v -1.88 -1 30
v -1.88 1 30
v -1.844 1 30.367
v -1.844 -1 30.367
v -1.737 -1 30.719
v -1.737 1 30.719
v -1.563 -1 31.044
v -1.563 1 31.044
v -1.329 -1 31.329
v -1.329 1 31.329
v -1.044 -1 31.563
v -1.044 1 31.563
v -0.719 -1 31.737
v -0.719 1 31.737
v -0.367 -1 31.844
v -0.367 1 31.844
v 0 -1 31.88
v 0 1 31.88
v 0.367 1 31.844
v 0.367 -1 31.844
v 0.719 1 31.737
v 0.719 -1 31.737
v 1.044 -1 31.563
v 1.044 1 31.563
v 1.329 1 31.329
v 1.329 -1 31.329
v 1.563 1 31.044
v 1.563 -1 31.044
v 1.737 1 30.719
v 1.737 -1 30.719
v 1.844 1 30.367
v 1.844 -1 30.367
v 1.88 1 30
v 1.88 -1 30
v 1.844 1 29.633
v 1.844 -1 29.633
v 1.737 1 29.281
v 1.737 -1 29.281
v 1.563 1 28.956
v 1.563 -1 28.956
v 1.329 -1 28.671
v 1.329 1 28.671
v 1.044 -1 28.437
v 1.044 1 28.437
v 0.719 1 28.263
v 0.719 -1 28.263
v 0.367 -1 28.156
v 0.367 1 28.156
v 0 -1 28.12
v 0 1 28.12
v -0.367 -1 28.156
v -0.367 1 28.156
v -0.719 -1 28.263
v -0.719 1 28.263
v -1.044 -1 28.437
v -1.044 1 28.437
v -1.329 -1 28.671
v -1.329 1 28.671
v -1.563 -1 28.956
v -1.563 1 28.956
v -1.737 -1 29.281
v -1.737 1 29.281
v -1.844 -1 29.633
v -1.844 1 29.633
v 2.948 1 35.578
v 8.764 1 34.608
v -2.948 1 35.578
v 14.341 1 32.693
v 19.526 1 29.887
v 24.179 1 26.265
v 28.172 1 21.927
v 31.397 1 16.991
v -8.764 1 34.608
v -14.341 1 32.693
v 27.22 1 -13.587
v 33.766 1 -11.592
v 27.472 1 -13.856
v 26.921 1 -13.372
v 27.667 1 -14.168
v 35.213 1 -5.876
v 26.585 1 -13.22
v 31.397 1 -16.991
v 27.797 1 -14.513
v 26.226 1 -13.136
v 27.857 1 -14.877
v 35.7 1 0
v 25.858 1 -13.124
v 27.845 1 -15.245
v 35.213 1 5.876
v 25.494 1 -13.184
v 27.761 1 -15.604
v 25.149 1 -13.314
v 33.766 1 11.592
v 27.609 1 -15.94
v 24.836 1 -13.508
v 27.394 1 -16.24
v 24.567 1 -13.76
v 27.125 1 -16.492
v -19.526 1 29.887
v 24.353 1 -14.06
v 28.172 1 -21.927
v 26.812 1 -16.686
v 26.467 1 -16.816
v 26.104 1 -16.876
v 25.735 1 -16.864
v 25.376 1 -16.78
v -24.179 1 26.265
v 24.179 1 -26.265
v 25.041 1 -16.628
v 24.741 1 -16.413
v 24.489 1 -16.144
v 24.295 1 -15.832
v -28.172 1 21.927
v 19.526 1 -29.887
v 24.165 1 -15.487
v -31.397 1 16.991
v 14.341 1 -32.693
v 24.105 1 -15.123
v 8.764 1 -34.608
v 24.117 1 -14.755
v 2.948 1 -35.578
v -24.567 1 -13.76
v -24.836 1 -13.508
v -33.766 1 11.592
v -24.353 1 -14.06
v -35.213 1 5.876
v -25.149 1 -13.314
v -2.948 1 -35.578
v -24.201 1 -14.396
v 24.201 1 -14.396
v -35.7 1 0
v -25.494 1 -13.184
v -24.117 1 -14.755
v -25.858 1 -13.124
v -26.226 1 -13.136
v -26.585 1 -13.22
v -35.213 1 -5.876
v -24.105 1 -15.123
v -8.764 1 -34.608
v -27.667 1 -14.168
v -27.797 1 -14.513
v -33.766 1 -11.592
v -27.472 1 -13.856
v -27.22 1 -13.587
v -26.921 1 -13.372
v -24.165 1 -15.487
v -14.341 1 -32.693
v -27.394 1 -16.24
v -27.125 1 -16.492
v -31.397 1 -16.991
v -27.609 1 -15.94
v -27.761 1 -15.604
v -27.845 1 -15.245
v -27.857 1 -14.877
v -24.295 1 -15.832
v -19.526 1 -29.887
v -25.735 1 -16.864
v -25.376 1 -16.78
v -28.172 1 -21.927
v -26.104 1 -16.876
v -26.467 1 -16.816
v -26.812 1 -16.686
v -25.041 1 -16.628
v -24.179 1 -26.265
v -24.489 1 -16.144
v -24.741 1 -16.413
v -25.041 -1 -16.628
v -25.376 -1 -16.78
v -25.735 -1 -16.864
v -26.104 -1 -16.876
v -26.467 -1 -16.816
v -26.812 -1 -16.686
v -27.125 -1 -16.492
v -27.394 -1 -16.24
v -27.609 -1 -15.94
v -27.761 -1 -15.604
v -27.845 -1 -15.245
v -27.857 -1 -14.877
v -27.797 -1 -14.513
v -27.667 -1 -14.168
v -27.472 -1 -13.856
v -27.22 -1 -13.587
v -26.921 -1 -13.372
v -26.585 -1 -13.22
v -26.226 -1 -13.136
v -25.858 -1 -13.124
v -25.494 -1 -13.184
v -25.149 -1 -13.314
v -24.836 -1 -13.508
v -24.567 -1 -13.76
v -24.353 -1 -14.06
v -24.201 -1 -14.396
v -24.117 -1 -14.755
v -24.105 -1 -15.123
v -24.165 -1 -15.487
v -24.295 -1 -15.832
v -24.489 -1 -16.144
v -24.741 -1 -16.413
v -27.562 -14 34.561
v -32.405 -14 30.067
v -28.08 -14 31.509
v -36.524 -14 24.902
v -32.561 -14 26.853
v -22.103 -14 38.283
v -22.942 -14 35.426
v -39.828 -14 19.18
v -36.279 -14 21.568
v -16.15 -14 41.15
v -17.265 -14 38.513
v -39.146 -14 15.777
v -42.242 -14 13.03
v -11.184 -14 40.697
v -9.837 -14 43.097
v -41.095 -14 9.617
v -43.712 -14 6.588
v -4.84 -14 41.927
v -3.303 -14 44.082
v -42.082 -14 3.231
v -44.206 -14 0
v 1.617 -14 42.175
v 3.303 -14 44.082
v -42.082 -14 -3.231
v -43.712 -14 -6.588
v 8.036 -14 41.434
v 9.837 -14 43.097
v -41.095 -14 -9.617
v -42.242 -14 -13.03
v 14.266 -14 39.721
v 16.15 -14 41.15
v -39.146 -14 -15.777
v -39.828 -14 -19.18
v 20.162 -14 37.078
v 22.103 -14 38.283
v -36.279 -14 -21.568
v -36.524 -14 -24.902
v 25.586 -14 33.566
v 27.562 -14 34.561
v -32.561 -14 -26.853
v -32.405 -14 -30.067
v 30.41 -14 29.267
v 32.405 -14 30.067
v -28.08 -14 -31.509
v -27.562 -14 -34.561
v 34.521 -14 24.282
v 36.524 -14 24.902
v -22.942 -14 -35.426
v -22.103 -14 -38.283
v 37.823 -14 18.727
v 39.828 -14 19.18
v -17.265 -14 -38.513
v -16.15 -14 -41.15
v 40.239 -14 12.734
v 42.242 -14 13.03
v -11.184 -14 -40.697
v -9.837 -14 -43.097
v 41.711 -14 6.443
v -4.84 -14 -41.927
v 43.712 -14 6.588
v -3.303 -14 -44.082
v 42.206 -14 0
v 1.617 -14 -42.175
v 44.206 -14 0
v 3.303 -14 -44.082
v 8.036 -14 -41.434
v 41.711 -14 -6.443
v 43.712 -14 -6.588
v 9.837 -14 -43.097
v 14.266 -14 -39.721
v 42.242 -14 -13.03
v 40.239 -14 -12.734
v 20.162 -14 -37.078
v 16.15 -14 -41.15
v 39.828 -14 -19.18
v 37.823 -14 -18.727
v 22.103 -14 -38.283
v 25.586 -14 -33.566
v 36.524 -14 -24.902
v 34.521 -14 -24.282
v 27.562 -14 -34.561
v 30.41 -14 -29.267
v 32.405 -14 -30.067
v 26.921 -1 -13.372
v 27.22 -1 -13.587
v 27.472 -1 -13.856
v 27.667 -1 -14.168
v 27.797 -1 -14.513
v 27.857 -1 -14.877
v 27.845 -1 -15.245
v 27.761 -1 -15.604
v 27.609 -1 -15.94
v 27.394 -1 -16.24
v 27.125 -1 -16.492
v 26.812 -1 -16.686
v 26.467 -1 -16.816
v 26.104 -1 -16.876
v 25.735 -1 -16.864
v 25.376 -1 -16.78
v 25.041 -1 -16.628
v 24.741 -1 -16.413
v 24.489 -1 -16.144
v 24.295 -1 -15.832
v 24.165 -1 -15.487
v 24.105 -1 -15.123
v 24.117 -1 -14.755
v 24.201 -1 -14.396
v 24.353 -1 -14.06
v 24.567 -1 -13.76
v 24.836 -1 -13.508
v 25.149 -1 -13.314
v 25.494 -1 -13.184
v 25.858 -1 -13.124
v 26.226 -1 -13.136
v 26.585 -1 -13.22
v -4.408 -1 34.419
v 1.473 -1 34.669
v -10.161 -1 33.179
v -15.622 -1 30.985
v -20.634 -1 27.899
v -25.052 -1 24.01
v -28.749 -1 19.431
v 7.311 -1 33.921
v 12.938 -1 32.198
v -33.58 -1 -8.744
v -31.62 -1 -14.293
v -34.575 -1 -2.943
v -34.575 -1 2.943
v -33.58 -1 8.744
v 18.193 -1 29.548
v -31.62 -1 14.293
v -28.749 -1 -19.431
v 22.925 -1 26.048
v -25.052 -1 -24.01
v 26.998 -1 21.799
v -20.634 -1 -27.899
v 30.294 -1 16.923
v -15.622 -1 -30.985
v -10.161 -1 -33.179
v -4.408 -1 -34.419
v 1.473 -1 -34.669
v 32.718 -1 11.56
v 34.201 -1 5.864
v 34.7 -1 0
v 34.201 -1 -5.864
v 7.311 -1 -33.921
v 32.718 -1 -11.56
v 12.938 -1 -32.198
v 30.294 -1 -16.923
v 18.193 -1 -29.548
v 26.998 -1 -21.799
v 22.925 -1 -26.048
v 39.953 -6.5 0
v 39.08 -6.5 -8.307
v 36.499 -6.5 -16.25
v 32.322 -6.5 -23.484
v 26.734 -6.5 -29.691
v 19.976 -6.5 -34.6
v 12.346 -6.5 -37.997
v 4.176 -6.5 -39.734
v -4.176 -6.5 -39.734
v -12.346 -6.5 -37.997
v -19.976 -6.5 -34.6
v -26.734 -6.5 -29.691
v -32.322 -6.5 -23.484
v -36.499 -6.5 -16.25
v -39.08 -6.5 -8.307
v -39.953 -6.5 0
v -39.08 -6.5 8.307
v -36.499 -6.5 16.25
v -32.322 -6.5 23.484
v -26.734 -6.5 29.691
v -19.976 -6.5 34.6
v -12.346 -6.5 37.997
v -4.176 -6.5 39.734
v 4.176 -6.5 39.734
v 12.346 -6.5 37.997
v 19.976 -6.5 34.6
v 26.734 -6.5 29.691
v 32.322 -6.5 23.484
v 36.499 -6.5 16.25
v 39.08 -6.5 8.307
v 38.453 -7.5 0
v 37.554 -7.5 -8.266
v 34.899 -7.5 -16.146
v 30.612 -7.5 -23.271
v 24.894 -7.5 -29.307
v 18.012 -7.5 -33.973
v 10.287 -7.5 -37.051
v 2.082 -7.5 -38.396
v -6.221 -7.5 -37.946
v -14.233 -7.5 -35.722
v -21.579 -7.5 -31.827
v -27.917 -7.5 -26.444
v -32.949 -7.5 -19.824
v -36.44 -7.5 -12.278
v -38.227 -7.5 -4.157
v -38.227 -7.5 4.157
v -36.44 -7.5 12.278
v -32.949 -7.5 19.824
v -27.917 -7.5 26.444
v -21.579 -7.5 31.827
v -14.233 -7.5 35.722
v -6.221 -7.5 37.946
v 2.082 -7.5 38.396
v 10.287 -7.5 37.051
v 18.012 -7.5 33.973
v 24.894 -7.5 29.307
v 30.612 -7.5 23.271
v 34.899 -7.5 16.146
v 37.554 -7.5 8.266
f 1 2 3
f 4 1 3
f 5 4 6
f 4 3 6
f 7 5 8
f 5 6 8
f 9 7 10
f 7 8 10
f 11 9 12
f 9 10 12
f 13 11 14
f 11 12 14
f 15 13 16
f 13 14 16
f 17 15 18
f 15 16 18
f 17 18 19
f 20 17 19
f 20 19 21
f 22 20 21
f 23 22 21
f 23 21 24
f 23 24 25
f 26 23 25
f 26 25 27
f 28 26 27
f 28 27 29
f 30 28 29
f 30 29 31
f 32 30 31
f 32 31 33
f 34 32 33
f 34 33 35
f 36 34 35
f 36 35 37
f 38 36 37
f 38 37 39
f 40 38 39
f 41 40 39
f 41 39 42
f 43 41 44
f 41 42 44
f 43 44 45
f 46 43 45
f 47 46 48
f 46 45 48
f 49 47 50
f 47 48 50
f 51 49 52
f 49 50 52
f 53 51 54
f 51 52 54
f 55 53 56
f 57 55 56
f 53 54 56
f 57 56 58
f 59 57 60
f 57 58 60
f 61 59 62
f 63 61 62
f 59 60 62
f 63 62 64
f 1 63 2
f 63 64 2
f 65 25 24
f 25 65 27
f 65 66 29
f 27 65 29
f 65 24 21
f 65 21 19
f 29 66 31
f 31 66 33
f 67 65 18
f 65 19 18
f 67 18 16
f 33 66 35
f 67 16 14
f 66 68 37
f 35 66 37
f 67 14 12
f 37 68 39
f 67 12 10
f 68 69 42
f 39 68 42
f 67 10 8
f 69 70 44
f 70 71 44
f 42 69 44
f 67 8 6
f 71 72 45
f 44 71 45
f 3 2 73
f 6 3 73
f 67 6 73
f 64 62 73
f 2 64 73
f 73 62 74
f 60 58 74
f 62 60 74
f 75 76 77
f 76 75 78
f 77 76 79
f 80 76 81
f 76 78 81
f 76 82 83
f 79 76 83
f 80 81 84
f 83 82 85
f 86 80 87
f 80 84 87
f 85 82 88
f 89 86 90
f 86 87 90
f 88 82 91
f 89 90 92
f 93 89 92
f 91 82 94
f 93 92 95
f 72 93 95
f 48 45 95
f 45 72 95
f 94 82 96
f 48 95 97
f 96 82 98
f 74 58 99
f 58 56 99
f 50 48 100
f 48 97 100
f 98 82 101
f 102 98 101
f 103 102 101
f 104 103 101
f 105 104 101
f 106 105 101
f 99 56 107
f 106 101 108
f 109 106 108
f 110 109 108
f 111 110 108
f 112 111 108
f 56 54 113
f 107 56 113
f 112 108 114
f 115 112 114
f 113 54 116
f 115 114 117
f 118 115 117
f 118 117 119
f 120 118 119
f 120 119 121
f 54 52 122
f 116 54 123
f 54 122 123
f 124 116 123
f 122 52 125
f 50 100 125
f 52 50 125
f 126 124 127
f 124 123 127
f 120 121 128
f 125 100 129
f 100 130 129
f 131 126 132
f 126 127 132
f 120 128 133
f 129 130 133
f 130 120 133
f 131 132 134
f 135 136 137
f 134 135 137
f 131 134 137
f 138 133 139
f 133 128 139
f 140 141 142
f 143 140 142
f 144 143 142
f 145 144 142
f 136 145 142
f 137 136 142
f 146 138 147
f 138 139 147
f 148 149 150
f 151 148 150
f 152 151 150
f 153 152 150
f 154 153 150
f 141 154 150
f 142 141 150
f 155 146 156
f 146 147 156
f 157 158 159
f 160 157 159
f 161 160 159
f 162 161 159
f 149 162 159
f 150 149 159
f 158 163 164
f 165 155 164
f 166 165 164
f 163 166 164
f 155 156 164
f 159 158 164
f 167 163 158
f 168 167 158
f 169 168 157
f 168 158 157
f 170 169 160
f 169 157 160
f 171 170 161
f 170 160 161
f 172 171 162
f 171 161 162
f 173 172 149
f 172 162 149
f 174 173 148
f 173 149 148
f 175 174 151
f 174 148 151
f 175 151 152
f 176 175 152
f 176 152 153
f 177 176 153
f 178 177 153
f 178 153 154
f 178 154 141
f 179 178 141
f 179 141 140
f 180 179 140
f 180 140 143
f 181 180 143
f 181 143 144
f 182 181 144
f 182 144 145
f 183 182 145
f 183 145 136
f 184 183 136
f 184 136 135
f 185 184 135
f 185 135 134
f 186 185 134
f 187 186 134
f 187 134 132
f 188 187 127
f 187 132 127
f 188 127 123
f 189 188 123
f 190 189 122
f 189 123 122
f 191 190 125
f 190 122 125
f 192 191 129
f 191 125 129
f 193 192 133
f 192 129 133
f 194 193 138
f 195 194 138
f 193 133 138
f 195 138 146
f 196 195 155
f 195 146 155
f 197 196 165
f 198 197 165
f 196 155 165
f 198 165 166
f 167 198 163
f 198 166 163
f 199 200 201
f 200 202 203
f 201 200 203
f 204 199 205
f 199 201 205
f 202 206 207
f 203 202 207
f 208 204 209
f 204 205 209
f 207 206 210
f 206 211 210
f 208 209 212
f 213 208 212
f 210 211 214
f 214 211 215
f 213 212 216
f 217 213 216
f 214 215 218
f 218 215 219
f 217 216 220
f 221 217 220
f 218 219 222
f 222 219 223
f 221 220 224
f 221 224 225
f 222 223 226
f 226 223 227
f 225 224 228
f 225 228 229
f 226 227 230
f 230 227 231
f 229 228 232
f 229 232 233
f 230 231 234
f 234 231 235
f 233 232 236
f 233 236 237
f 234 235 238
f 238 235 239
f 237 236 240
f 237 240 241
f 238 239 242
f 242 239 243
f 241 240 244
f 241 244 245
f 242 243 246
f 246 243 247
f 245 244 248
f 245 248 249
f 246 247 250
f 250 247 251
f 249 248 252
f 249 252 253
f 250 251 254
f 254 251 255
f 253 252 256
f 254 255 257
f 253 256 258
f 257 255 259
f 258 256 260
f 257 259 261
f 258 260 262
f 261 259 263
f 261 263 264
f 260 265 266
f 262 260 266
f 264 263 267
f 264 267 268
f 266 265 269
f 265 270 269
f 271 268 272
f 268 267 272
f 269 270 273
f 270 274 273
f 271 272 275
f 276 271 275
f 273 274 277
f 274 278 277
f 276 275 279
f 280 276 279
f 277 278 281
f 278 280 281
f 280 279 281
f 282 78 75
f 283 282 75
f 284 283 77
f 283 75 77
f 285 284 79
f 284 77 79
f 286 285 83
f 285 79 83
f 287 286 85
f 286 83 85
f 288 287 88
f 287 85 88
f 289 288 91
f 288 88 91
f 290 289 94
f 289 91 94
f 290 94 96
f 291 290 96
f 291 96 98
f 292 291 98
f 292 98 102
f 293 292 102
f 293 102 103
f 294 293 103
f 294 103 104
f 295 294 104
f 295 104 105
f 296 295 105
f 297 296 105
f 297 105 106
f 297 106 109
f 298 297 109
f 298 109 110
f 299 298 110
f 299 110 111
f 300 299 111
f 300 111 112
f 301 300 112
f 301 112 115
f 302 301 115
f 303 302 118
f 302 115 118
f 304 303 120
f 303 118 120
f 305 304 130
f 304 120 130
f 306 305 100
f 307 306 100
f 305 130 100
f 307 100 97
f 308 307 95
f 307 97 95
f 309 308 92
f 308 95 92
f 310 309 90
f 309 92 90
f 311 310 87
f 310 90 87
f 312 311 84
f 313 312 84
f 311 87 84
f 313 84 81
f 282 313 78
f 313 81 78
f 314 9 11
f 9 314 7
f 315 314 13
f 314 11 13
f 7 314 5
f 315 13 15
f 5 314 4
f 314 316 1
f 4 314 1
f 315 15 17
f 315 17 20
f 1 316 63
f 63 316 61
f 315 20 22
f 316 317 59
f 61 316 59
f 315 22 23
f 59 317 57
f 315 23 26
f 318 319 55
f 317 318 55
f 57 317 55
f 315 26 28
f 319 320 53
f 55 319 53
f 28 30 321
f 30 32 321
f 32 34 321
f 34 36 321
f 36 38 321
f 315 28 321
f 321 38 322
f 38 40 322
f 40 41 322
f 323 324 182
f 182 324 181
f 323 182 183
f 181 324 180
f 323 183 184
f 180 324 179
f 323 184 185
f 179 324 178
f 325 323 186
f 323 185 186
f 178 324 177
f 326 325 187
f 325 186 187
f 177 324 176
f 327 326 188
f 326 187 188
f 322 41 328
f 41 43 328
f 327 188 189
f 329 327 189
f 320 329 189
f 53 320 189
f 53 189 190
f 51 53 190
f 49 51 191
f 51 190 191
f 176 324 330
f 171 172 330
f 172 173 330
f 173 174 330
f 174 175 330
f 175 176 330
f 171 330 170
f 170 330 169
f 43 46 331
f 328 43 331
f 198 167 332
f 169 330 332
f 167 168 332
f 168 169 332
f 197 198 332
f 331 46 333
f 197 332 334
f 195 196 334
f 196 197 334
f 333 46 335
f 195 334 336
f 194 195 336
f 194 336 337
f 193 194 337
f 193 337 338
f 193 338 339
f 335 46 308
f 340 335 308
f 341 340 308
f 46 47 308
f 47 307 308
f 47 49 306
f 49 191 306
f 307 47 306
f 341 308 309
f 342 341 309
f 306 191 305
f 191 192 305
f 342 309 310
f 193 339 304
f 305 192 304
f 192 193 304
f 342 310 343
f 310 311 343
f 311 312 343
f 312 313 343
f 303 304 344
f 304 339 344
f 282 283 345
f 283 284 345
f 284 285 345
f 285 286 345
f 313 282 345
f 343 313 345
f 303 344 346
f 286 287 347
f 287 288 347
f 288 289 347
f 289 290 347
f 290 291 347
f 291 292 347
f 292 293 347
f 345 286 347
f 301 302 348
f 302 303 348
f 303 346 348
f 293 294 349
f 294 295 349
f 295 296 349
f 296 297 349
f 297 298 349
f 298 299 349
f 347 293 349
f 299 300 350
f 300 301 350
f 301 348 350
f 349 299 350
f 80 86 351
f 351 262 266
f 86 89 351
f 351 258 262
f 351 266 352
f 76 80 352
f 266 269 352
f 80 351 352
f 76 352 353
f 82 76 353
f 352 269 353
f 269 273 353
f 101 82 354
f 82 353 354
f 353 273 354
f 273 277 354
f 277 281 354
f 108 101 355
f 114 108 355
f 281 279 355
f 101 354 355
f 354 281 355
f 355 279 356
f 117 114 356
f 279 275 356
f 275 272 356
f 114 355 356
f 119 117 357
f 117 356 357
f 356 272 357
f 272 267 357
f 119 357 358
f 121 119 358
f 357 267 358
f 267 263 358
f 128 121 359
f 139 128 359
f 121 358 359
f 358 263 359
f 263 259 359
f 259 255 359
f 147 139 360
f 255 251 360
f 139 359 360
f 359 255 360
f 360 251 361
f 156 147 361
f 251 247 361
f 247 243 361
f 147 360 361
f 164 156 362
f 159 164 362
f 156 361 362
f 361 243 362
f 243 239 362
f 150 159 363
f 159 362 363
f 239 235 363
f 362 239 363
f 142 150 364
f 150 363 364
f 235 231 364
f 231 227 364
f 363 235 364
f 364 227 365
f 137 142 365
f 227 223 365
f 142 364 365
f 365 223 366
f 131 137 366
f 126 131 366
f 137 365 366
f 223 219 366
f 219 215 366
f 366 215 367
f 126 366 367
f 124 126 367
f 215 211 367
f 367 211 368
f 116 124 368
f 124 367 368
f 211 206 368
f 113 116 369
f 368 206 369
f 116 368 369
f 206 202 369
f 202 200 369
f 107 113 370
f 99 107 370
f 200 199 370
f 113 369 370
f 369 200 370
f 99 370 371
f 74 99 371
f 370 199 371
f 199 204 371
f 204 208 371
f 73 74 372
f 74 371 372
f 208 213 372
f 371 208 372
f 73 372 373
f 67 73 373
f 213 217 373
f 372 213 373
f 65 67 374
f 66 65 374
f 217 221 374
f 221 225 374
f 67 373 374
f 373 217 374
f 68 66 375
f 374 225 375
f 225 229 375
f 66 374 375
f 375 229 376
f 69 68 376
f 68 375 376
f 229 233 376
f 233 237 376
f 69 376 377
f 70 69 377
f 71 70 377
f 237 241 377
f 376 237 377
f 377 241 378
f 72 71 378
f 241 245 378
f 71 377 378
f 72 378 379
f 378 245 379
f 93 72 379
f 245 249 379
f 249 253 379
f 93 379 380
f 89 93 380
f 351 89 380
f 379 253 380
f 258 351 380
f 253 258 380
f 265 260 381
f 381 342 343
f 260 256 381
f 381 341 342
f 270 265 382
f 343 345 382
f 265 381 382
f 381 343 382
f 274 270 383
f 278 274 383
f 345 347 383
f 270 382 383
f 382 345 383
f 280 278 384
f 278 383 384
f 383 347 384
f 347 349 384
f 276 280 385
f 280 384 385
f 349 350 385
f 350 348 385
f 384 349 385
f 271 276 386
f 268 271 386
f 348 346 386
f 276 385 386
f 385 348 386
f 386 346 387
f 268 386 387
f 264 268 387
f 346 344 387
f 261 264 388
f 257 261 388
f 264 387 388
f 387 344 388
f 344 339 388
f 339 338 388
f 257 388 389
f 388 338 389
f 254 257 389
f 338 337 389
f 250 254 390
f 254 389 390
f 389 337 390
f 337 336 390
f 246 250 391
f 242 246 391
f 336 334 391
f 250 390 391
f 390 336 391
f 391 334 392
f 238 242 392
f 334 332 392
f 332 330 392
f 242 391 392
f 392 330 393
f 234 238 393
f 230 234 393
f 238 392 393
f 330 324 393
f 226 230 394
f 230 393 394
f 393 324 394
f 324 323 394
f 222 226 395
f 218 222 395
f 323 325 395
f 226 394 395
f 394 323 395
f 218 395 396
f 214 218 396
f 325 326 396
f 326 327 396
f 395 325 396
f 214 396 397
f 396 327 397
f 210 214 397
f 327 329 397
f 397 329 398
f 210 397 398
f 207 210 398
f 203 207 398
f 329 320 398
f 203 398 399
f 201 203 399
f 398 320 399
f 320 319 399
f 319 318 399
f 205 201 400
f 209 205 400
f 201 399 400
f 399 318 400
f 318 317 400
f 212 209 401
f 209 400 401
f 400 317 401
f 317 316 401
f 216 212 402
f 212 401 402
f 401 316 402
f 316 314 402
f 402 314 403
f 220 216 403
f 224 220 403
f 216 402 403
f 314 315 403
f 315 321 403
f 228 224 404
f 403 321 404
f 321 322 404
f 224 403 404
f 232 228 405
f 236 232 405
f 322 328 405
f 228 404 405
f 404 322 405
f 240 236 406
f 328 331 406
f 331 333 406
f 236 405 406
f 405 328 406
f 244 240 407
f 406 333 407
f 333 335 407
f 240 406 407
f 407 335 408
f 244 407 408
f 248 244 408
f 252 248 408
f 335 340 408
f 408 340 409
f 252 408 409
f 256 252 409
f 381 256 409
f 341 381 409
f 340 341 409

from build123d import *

# Parameters (mm, degrees)
SKETCH002_R        = 1.88
POCKET001_DEPTH    = 266.858481
POLARPATTERN_COUNT = 3


with BuildPart() as part:
    # Sketch → Revolution (revolve)
    with BuildSketch(Plane.XY):
        Polygon((0, 1), (35.7, 1), (44.205553, -14), (42.205553, -14), (34.7, -1), (0, -1), align=None)
    revolve(axis=Axis((0, 0, 0), (0, 1, 0)))

    # Sketch002 → Pocket001 (cut, through all)
    with BuildSketch(Plane(origin=(0, 1, 0), x_dir=(-1, 0, 0), z_dir=(0, 1, 0))):
        with Locations((0, 30)):
            Circle(SKETCH002_R)
    pocket001 = extrude(amount=-POCKET001_DEPTH, mode=Mode.SUBTRACT)

    # PolarPattern: Pocket001 ×3 about axis
    polarpattern_axis = Axis((0, 1, 0), (0, 1, 0))
    for i in range(1, POLARPATTERN_COUNT):
        add(pocket001.rotate(polarpattern_axis, i * 360 / POLARPATTERN_COUNT), mode=Mode.SUBTRACT)


solid = part.part
